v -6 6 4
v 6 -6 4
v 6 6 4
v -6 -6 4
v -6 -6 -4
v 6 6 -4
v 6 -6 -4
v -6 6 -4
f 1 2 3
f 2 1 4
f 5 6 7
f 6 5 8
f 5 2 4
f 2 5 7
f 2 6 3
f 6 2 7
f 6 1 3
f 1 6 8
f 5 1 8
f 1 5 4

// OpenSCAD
size=32; //block=32 //item=8

translate([0,0,0]){
cube([size*0.375,size*0.375,size*0.25],center=true);	//hinge
};	//translate
